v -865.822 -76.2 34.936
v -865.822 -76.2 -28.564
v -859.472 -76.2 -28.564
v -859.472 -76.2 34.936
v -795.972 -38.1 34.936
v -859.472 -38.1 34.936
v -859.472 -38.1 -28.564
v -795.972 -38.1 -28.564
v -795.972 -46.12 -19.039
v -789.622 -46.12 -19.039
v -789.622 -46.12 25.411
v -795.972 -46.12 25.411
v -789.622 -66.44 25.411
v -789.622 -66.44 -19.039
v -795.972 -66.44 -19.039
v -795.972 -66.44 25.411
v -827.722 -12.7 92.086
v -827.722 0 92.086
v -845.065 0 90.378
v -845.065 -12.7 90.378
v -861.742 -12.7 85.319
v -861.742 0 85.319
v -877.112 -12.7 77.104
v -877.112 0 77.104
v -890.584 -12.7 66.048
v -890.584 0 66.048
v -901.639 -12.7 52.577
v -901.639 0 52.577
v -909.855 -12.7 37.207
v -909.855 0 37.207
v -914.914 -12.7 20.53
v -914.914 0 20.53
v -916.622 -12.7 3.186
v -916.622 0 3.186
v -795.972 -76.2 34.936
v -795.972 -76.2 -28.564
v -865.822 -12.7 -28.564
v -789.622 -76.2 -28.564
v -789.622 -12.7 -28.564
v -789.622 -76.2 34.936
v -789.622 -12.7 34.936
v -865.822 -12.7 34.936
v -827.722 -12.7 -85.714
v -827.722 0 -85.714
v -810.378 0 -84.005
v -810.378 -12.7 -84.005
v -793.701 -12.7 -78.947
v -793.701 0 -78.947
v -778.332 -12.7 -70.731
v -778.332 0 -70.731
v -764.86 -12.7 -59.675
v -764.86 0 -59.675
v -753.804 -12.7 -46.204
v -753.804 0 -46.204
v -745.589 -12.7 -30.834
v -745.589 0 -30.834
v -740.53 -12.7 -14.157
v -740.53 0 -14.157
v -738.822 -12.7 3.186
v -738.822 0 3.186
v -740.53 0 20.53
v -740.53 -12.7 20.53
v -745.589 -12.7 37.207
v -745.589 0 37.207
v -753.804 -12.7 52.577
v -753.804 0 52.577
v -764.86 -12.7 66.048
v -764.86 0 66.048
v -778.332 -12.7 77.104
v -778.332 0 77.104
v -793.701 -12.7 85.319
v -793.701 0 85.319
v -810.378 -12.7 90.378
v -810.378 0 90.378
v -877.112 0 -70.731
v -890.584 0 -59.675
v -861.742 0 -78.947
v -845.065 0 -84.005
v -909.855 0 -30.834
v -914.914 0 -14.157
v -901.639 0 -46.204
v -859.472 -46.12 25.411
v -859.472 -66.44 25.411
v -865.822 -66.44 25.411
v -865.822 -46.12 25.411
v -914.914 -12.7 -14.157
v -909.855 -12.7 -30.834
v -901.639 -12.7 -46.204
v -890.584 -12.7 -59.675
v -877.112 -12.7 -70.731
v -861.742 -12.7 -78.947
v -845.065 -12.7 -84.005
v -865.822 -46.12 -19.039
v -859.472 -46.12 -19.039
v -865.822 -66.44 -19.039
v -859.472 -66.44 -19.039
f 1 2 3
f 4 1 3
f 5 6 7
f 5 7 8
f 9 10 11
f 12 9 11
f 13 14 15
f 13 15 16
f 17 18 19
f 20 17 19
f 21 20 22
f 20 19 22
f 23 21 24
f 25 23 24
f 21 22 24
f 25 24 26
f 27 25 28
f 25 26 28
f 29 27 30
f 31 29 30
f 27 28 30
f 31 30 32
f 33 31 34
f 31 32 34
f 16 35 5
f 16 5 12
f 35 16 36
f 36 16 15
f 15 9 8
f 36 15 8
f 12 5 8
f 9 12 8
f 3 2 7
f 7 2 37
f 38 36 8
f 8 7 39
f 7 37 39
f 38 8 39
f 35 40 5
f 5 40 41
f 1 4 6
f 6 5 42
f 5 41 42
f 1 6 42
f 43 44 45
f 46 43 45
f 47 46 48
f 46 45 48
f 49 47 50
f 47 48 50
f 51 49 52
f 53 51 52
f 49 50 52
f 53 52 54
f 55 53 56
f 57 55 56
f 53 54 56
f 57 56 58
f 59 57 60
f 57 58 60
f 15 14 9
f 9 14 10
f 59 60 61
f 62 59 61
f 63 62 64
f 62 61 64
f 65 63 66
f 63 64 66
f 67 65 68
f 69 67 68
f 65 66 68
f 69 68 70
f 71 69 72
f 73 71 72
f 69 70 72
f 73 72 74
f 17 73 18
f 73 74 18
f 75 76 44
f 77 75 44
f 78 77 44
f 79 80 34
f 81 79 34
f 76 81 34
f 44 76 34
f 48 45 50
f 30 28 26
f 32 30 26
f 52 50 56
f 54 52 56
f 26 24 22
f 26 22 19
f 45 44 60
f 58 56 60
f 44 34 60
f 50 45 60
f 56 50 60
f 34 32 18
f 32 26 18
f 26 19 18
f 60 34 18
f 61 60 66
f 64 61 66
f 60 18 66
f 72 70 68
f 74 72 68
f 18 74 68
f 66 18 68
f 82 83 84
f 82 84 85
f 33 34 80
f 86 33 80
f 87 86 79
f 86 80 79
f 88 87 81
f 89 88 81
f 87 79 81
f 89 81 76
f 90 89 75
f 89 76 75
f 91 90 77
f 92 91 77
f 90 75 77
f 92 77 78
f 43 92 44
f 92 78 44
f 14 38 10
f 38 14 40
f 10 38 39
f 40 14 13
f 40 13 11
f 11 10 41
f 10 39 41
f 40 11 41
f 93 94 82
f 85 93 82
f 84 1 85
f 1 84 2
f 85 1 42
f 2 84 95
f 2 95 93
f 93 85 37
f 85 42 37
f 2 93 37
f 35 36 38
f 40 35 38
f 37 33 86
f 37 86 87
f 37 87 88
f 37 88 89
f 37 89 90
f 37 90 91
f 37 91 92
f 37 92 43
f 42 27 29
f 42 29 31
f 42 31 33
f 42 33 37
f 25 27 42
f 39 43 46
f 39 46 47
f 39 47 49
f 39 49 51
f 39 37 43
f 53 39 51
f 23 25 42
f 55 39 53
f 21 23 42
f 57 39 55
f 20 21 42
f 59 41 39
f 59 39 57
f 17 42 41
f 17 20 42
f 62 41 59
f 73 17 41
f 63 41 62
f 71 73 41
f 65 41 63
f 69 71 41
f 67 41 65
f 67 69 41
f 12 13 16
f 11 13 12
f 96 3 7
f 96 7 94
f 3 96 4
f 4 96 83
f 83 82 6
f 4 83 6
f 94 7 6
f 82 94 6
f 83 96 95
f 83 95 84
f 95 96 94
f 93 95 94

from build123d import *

# Parameters (mm, degrees)
F1_DEPTH = 12.7
F0_W     = 6.35
F0_H     = 31.75
F2_DEPTH = 76.2
F0_W_2   = 31.75
F3_DEPTH = 38.1
F4_W     = 20.32
F4_H     = 44.45
F5_DEPTH = 200.02717


with BuildPart() as f1:
    # F0 (on Front) → F1 (new body)
    with BuildSketch(Plane.XZ):
        with BuildLine():
            Line((-789.6218383789, 3.1863217354), (-738.8218383789, 3.1863217354))
            ThreePointArc((-738.8218383789, 3.1863217354), (-764.8600455314, 66.0481145829), (-827.7218383789, 92.0863217354))
            Line((-827.7218383789, 92.0863217354), (-827.7218383789, 34.9363217354))
            Line((-827.7218383789, 34.9363217354), (-795.9718383789, 34.9363217354))
            Line((-795.9718383789, 34.9363217354), (-789.6218383789, 34.9363217354))
            Line((-789.6218383789, 34.9363217354), (-789.6218383789, 3.1863217354))
        make_face()
        with BuildLine():
            Line((-827.7218383789, 34.9363217354), (-827.7218383789, 92.0863217354))
            ThreePointArc((-827.7218383789, 92.0863217354), (-890.5836312264, 66.0481145829), (-916.6218383789, 3.1863217354))
            Line((-916.6218383789, 3.1863217354), (-865.8218383789, 3.1863217354))
            Line((-865.8218383789, 3.1863217354), (-865.8218383789, 34.9363217354))
            Line((-865.8218383789, 34.9363217354), (-859.4718383789, 34.9363217354))
            Line((-859.4718383789, 34.9363217354), (-827.7218383789, 34.9363217354))
        make_face()
        with BuildLine():
            ThreePointArc((-916.6218383789, 3.1863217354), (-890.5836312264, -59.6754711121), (-827.7218383789, -85.7136782646))
            Line((-827.7218383789, -85.7136782646), (-827.7218383789, -28.5636782646))
            Line((-827.7218383789, -28.5636782646), (-859.4718383789, -28.5636782646))
            Line((-859.4718383789, -28.5636782646), (-865.8218383789, -28.5636782646))
            Line((-865.8218383789, -28.5636782646), (-865.8218383789, 3.1863217354))
            Line((-865.8218383789, 3.1863217354), (-916.6218383789, 3.1863217354))
        make_face()
        with BuildLine():
            ThreePointArc((-827.7218383789, -85.7136782646), (-764.8600455314, -59.6754711121), (-738.8218383789, 3.1863217354))
            Line((-738.8218383789, 3.1863217354), (-789.6218383789, 3.1863217354))
            Line((-789.6218383789, 3.1863217354), (-789.6218383789, -28.5636782646))
            Line((-789.6218383789, -28.5636782646), (-795.9718383789, -28.5636782646))
            Line((-795.9718383789, -28.5636782646), (-827.7218383789, -28.5636782646))
            Line((-827.7218383789, -28.5636782646), (-827.7218383789, -85.7136782646))
        make_face()
    extrude(amount=F1_DEPTH)

    # F0 (on Front) → F2 (join)
    with BuildSketch(Plane.XZ):
        with Locations((-862.6468383789, -12.6886782646)):
            Rectangle(F0_W, F0_H)
        with Locations((-862.6468383789, 19.0613217354)):
            Rectangle(F0_W, F0_H)
        with Locations((-792.7968383789, -12.6886782646)):
            Rectangle(F0_W, F0_H)
        with Locations((-792.7968383789, 19.0613217354)):
            Rectangle(F0_W, F0_H)
    extrude(amount=F2_DEPTH)

    # F0 (on Front) → F3 (join)
    with BuildSketch(Plane.XZ):
        with Locations((-811.8468383789, -12.6886782646)):
            Rectangle(F0_W_2, F0_H)
        with Locations((-843.5968383789, -12.6886782646)):
            Rectangle(F0_W_2, F0_H)
        with Locations((-843.5968383789, 19.0613217354)):
            Rectangle(F0_W_2, F0_H)
        with Locations((-811.8468383789, 19.0613217354)):
            Rectangle(F0_W_2, F0_H)
    extrude(amount=F3_DEPTH)

    # F4 (on face) → F5 (cut)
    with BuildSketch(Plane.YZ.offset(-789.6218383789)):
        with Locations((-56.2796956563, 3.1863217354)):
            Rectangle(F4_W, F4_H)
    extrude(amount=-F5_DEPTH, mode=Mode.SUBTRACT)


solid = f1.part
